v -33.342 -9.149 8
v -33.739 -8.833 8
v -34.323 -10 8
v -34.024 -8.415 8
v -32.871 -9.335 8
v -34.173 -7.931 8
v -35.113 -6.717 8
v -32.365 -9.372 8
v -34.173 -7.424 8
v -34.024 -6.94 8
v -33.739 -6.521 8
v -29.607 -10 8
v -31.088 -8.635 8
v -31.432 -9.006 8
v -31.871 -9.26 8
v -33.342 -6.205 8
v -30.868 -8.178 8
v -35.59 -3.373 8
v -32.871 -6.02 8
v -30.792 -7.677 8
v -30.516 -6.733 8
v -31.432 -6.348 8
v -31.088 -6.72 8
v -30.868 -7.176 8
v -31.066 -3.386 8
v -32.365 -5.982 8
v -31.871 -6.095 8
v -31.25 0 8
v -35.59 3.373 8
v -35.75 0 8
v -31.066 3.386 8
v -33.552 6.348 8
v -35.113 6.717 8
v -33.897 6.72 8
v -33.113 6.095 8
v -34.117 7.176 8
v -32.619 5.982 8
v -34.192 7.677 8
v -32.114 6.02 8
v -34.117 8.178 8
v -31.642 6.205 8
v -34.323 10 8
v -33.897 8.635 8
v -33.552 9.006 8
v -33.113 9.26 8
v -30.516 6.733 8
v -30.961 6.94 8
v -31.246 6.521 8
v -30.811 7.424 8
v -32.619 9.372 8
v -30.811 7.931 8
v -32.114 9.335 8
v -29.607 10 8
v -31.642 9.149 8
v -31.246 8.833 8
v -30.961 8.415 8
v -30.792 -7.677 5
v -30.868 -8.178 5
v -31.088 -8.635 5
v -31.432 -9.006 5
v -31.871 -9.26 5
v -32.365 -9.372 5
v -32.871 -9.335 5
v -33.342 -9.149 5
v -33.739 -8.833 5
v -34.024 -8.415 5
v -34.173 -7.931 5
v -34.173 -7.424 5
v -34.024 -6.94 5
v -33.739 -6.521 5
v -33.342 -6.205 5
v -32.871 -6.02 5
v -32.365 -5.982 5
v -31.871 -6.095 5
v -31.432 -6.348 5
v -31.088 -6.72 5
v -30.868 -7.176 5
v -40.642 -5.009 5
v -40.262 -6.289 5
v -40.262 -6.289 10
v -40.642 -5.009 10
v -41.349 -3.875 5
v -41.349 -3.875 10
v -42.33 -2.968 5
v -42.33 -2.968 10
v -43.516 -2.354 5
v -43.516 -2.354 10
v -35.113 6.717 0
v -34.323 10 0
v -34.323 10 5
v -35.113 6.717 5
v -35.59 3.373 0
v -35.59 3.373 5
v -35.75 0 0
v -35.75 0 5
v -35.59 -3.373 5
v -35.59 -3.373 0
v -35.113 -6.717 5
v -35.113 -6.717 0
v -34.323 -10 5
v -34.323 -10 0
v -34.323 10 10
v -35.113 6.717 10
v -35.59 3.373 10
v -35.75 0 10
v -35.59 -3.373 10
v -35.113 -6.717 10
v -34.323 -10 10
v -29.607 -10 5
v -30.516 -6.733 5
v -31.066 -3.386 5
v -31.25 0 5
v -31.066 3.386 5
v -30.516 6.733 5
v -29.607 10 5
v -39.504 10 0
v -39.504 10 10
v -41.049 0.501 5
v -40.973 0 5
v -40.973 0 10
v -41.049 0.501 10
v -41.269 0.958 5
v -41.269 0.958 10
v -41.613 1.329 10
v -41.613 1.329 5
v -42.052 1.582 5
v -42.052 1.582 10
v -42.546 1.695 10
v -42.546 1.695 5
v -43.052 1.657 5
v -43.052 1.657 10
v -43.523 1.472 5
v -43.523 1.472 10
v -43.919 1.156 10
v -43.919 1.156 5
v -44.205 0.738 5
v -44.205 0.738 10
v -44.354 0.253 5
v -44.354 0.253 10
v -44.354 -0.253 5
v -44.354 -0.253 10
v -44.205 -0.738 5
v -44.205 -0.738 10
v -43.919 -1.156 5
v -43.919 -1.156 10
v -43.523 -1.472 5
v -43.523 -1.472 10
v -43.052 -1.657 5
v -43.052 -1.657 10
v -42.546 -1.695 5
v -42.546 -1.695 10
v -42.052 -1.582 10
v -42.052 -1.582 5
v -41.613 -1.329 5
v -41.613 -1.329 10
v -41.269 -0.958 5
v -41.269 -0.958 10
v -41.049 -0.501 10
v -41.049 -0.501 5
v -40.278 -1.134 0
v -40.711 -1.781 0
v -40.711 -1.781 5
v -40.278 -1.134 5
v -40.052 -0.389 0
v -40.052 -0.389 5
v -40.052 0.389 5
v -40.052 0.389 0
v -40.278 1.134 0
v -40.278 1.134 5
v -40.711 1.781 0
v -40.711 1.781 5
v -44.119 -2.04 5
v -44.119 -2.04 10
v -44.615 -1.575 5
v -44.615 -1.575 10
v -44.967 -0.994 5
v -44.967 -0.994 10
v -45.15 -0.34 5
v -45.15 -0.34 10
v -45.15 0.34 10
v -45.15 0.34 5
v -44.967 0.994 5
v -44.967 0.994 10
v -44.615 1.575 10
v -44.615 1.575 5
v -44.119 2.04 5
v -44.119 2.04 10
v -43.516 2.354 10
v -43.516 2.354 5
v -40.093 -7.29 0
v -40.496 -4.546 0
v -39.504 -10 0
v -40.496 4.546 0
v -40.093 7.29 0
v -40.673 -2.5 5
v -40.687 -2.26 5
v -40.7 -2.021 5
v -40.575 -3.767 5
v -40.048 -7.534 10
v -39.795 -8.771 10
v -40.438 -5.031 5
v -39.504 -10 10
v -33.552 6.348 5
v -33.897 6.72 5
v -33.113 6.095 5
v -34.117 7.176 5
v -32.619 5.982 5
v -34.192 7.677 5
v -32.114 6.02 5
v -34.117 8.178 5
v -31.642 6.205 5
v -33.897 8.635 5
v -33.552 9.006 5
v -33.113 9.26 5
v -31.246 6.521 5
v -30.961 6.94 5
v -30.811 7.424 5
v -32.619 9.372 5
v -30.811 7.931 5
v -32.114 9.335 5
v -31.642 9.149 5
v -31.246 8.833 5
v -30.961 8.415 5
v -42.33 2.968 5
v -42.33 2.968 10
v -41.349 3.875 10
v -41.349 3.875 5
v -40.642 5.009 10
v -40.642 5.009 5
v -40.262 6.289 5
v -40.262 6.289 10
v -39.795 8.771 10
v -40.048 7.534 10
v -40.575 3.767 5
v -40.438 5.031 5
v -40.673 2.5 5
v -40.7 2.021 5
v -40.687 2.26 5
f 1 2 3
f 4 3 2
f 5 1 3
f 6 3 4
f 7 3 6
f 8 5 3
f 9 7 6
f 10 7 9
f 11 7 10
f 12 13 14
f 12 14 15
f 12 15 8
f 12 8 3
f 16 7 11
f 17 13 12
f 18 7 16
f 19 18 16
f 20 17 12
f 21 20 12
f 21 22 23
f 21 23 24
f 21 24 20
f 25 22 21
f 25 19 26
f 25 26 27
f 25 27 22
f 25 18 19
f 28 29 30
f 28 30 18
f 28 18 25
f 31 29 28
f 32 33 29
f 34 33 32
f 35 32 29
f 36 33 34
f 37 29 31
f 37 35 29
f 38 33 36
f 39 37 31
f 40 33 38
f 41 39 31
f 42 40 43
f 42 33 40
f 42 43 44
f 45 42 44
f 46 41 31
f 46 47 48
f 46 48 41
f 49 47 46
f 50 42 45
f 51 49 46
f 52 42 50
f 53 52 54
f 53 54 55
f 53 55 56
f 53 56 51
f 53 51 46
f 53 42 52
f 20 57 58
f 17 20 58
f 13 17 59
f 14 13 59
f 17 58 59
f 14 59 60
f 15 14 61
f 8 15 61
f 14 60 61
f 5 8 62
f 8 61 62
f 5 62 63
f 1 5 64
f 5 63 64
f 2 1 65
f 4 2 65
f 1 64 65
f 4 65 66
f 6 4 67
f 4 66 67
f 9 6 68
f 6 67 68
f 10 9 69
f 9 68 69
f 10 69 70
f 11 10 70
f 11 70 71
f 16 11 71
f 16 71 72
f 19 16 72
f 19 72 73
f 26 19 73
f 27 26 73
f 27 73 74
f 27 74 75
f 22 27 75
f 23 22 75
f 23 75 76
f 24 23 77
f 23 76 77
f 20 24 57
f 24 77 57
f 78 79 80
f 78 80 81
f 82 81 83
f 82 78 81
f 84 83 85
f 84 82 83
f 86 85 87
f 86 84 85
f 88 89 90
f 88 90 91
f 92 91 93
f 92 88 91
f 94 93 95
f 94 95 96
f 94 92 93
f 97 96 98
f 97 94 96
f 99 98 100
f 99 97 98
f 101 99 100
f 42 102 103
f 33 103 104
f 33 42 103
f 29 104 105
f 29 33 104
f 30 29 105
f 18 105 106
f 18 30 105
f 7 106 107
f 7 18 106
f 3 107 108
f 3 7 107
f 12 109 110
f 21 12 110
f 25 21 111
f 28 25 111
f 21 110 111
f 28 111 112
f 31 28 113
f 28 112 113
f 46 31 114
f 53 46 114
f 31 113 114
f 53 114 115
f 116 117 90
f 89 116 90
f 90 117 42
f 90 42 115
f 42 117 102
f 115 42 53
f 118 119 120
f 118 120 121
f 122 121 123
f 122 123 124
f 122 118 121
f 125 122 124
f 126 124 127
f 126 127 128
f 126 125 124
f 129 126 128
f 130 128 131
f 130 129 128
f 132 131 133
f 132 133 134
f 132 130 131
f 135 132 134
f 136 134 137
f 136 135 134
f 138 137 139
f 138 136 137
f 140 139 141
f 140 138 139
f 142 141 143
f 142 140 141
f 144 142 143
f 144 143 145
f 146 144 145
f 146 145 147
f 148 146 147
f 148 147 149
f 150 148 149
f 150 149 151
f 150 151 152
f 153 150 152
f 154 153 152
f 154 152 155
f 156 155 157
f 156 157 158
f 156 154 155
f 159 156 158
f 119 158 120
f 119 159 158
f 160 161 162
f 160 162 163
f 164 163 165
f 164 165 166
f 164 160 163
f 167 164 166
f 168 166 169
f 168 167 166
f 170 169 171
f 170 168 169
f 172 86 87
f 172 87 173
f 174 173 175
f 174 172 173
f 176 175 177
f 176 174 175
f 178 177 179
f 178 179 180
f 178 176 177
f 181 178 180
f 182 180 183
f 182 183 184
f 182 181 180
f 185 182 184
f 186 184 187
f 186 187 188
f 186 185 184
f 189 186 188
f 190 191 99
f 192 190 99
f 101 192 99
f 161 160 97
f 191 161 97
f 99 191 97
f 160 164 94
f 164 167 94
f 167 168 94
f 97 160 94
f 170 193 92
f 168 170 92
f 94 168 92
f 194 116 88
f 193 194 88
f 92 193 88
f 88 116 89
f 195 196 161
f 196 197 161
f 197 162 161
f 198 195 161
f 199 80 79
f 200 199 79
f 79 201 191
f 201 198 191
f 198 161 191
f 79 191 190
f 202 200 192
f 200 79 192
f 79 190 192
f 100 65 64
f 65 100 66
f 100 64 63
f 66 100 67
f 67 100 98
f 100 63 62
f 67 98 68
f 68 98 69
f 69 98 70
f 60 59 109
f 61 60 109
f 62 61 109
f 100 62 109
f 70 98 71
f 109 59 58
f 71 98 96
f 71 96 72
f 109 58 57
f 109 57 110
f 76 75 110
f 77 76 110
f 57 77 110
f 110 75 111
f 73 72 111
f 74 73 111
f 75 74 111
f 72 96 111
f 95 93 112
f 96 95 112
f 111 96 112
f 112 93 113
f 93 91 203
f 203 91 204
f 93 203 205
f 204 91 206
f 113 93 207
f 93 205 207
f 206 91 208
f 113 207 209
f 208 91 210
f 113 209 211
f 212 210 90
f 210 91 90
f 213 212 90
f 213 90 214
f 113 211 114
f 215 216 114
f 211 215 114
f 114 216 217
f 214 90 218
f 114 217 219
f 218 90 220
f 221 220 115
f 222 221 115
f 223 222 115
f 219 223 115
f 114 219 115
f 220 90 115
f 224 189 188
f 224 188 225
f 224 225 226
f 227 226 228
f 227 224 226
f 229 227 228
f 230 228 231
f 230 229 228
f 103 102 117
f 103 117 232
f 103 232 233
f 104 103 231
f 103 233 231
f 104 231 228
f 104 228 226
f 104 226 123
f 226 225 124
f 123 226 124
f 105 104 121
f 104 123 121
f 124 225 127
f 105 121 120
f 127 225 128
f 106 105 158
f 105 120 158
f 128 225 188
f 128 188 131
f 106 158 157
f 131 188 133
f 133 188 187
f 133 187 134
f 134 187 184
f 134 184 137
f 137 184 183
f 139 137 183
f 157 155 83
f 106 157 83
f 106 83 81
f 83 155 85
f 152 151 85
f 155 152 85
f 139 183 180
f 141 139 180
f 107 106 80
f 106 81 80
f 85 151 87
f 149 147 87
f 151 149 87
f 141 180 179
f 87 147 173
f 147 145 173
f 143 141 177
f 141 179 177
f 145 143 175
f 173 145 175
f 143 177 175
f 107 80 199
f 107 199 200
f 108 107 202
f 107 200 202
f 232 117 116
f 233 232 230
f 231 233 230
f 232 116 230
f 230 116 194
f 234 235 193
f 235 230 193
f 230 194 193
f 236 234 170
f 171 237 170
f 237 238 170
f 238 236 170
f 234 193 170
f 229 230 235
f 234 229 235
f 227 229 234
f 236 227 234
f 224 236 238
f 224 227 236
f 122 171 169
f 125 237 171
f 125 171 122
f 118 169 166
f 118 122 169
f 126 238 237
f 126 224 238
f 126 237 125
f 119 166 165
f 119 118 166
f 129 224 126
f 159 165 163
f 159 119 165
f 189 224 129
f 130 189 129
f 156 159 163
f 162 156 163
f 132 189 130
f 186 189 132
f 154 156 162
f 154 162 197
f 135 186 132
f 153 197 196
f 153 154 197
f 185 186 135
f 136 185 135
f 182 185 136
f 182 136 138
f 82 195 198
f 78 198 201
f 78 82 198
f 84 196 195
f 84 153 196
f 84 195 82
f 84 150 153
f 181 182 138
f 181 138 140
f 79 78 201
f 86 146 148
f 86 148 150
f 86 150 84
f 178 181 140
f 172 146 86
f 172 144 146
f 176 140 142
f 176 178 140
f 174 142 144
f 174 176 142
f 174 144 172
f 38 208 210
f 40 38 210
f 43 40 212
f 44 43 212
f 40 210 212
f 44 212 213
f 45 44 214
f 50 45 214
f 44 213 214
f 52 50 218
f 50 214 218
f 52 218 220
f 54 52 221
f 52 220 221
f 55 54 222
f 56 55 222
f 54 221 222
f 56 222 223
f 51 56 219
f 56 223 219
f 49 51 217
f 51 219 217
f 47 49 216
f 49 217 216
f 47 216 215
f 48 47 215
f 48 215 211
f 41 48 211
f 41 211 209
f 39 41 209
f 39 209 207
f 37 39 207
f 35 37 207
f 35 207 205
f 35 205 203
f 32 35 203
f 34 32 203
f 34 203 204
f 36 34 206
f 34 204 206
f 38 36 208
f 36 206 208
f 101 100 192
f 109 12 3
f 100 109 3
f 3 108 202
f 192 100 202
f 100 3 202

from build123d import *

# Parameters (mm, degrees)
CROQUIS1_R                       = 40.75
CROQUIS1_R_2                     = 35.75
SALIENTE_EXTRUIR1_DEPTH          = 10
CROQUIS2_R                       = 1.7
SALIENTE_EXTRUIR2_DEPTH          = 3
SALIENTE_EXTRUIR3_START          = -5
CROQUIS3_R                       = 1.7
SALIENTE_EXTRUIR3_DEPTH          = 5
CORTAR_EXTRUIR1_DEPTH            = 10
REDONDEO1_R                      = 5
TALADRO_DE_MARGEN_PARA_M51_DEPTH = 5


# Read off the part's stored shape, not the designer's step: Taladro de margen para M51
with BuildPart() as part:
    # Croquis1 → Saliente-Extruir1 (new body)
    with BuildSketch(Plane.XY):
        Circle(CROQUIS1_R)
        Circle(CROQUIS1_R_2, mode=Mode.SUBTRACT)
    extrude(amount=SALIENTE_EXTRUIR1_DEPTH)

    # Croquis2 → Saliente-Extruir2 (add)
    with BuildSketch(Plane(origin=(0, 0, 5), x_dir=(-1, 0, 0), z_dir=(0, 0, -1))):
        with BuildLine():
            Line((34.322915086, -10), (29.606798206, -10))
            ThreePointArc((29.606798206, -10), (31.25, 0), (29.606798206, 10))
            Line((29.606798206, 10), (34.322915086, 10))
            ThreePointArc((34.322915086, 10), (35.75, 0), (34.322915086, -10))
        make_face()
        with Locations((32.492418426, 7.677165354)):
            Circle(CROQUIS2_R, mode=Mode.SUBTRACT)
        with Locations(Location((32.492418426, -7.677165354, 0), (0, 0, 180))):
            Circle(CROQUIS2_R, mode=Mode.SUBTRACT)
    extrude(amount=-SALIENTE_EXTRUIR2_DEPTH)

    # Croquis3 → Saliente-Extruir3 (add)
    with BuildSketch(Plane.XY.offset(10).offset(SALIENTE_EXTRUIR3_START)):
        with BuildLine():
            Line((-40.673240589, -2.5), (-42.673240589, -2.5))
            ThreePointArc((-42.673240589, -2.5), (-45.173240589, 0), (-42.673240589, 2.5))
            Line((-42.673240589, 2.5), (-40.673240589, 2.5))
            ThreePointArc((-40.673240589, 2.5), (-40.75, 0), (-40.673240589, -2.5))
        make_face()
        with Locations((-42.673240589, 0)):
            Circle(CROQUIS3_R, mode=Mode.SUBTRACT)
    extrude(amount=SALIENTE_EXTRUIR3_DEPTH)

    # Croquis4 → Cortar-Extruir1 (cut)
    with BuildSketch(Plane.XY.offset(10)):
        Polygon((-34.322915086, -10), (-63.814245497, -10), (-63.814245497, -44.810382184), (45.541144723, -44.810382184), (45.541144723, 45.96065319), (-49.780136639, 45.96065319), (-49.780136639, 10), (-39.503955498, 10), (-24.875936239, 10), (-24.875936239, -15.19237414), align=None)
    extrude(amount=-CORTAR_EXTRUIR1_DEPTH, mode=Mode.SUBTRACT)

    # Redondeo1
    # the kernel refuses this fillet: 5 mm, written as the material it adds along each edge
    with BuildSketch(Plane(origin=(-40.673240589, -2.5, 5), x_dir=(0.10796118489430687, -0.9941551099080149, 0), z_dir=(0, 0, 1))) as redondeo1_piece_1:
        with BuildLine():
            CenterArc((4.0453205, -4.994529194), REDONDEO1_R, 92.68051287, 61.418565497)
            Line((-0.452433263, -2.810447903), (-0.902208639, -2.592039774))
            ThreePointArc((-0.902208639, -2.592039774), (-0.712999925, -1.934329627), (-0.497077555, 0.053980592))
            Line((-0.497077555, 0.053980592), (0.023383355, 0.499452919))
            ThreePointArc((0.023383355, 0.499452919), (1.905743473, 0.45541293), (3.78810359, 0.499452919))
            Line((3.78810359, 0.499452919), (3.811486945, 0))
        make_face()
    extrude(amount=5)
    with BuildSketch(Plane(origin=(-40.673240589, 2.5, 5), x_dir=(0.1079611848943066, 0.994155109908015, 0), z_dir=(0, 0, 1))) as redondeo1_piece_2:
        with BuildLine():
            CenterArc((4.0453205, 4.994529194), REDONDEO1_R, 205.900921633, 61.418565497)
            Line((-0.452433263, 2.810447903), (-0.902208639, 2.592039774))
            ThreePointArc((-0.902208639, 2.592039774), (-0.712999925, 1.934329627), (-0.497077555, -0.053980592))
            Line((-0.497077555, -0.053980592), (0.023383355, -0.499452919))
            ThreePointArc((0.023383355, -0.499452919), (1.905743473, -0.45541293), (3.78810359, -0.499452919))
            Line((3.78810359, -0.499452919), (3.811486945, 0))
        make_face()
    extrude(amount=5)

    # Taladro de margen para M51 outline → Taladro de margen para M51 (cut)
    with BuildSketch(Plane.XY):
        with BuildLine():
            ThreePointArc((-40.711057028, -1.781105183), (-40.023240589, 0), (-40.711057028, 1.781105183))
            ThreePointArc((-40.711057028, 1.781105183), (-40.75, 0), (-40.711057028, -1.781105183))
        make_face()
    extrude(amount=TALADRO_DE_MARGEN_PARA_M51_DEPTH, mode=Mode.SUBTRACT)


solid = part.part
